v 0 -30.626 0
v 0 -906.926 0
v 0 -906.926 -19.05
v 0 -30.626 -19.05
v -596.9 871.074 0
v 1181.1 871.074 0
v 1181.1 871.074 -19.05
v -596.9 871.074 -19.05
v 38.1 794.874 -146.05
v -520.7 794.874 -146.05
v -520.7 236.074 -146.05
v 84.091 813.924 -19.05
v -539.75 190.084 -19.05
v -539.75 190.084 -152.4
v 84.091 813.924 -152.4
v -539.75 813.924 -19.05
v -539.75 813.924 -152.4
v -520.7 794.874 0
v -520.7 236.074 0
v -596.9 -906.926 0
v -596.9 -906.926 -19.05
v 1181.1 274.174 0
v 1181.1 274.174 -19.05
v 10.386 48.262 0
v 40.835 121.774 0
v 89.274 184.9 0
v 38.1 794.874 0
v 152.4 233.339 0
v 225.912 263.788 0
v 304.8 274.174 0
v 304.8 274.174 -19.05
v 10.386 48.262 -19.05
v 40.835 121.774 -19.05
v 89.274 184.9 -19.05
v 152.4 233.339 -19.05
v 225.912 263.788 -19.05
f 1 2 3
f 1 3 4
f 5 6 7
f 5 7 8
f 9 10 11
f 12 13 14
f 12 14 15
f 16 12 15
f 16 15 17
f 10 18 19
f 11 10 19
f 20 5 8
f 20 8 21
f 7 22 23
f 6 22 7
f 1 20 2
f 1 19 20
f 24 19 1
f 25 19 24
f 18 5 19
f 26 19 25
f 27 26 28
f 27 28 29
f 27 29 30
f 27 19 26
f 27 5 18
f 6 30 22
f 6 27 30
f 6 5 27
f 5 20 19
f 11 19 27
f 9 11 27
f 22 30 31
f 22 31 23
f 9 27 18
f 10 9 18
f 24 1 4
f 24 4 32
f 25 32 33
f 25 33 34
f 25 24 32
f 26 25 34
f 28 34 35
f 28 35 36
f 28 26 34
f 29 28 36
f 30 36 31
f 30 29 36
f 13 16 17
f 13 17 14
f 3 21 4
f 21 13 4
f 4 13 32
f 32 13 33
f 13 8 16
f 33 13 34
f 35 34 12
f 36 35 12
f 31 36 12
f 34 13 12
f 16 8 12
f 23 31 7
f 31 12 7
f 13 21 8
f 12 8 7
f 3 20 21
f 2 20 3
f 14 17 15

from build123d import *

# Parameters (mm, degrees)
F1_DEPTH = 19.05
F2_DEPTH = 152.4
F3_DEPTH = 152.4
F4_DEPTH = 146.05


with BuildPart() as f1:
    # F0 (on Top) → F1 (new body)
    with BuildSketch(Plane.XY):
        with BuildLine():
            Line((-596.9, 871.074308), (-596.9, -906.925692))
            Line((-596.9, -906.925692), (0, -906.925692))
            Line((0, -906.925692), (0, -30.625692))
            ThreePointArc((0, -30.625692), (89.273853, 184.900455), (304.8, 274.174308))
            Line((304.8, 274.174308), (1181.1, 274.174308))
            Line((1181.1, 274.174308), (1181.1, 871.074308))
            Line((1181.1, 871.074308), (-596.9, 871.074308))
        make_face()
        Polygon((-539.75, 190.08354), (-539.75, 813.924308), (84.090768, 813.924308), align=None, mode=Mode.SUBTRACT)
        Polygon((-520.7, 794.874308), (-520.7, 236.074308), (38.1, 794.874308), align=None)
        Polygon((84.090768, 813.924308), (-539.75, 813.924308), (-539.75, 190.08354), align=None)
        Polygon((38.1, 794.874308), (-520.7, 236.074308), (-520.7, 794.874308), align=None, mode=Mode.SUBTRACT)
    extrude(amount=-F1_DEPTH)

    # F0 (on Top) → F2 (join)
    with BuildSketch(Plane.XY):
        Polygon((84.090768, 813.924308), (-539.75, 813.924308), (-539.75, 190.08354), align=None)
        Polygon((38.1, 794.874308), (-520.7, 236.074308), (-520.7, 794.874308), align=None, mode=Mode.SUBTRACT)
    extrude(amount=-F2_DEPTH)

    # F0 (on Top) → F3 (join)
    with BuildSketch(Plane.XY):
        Polygon((-520.7, 794.874308), (-520.7, 236.074308), (38.1, 794.874308), align=None)
    extrude(amount=-F3_DEPTH)

    # F0 (on Top) → F4 (cut)
    with BuildSketch(Plane.XY):
        Polygon((-520.7, 794.874308), (-520.7, 236.074308), (38.1, 794.874308), align=None)
    extrude(amount=-F4_DEPTH, mode=Mode.SUBTRACT)


solid = f1.part
